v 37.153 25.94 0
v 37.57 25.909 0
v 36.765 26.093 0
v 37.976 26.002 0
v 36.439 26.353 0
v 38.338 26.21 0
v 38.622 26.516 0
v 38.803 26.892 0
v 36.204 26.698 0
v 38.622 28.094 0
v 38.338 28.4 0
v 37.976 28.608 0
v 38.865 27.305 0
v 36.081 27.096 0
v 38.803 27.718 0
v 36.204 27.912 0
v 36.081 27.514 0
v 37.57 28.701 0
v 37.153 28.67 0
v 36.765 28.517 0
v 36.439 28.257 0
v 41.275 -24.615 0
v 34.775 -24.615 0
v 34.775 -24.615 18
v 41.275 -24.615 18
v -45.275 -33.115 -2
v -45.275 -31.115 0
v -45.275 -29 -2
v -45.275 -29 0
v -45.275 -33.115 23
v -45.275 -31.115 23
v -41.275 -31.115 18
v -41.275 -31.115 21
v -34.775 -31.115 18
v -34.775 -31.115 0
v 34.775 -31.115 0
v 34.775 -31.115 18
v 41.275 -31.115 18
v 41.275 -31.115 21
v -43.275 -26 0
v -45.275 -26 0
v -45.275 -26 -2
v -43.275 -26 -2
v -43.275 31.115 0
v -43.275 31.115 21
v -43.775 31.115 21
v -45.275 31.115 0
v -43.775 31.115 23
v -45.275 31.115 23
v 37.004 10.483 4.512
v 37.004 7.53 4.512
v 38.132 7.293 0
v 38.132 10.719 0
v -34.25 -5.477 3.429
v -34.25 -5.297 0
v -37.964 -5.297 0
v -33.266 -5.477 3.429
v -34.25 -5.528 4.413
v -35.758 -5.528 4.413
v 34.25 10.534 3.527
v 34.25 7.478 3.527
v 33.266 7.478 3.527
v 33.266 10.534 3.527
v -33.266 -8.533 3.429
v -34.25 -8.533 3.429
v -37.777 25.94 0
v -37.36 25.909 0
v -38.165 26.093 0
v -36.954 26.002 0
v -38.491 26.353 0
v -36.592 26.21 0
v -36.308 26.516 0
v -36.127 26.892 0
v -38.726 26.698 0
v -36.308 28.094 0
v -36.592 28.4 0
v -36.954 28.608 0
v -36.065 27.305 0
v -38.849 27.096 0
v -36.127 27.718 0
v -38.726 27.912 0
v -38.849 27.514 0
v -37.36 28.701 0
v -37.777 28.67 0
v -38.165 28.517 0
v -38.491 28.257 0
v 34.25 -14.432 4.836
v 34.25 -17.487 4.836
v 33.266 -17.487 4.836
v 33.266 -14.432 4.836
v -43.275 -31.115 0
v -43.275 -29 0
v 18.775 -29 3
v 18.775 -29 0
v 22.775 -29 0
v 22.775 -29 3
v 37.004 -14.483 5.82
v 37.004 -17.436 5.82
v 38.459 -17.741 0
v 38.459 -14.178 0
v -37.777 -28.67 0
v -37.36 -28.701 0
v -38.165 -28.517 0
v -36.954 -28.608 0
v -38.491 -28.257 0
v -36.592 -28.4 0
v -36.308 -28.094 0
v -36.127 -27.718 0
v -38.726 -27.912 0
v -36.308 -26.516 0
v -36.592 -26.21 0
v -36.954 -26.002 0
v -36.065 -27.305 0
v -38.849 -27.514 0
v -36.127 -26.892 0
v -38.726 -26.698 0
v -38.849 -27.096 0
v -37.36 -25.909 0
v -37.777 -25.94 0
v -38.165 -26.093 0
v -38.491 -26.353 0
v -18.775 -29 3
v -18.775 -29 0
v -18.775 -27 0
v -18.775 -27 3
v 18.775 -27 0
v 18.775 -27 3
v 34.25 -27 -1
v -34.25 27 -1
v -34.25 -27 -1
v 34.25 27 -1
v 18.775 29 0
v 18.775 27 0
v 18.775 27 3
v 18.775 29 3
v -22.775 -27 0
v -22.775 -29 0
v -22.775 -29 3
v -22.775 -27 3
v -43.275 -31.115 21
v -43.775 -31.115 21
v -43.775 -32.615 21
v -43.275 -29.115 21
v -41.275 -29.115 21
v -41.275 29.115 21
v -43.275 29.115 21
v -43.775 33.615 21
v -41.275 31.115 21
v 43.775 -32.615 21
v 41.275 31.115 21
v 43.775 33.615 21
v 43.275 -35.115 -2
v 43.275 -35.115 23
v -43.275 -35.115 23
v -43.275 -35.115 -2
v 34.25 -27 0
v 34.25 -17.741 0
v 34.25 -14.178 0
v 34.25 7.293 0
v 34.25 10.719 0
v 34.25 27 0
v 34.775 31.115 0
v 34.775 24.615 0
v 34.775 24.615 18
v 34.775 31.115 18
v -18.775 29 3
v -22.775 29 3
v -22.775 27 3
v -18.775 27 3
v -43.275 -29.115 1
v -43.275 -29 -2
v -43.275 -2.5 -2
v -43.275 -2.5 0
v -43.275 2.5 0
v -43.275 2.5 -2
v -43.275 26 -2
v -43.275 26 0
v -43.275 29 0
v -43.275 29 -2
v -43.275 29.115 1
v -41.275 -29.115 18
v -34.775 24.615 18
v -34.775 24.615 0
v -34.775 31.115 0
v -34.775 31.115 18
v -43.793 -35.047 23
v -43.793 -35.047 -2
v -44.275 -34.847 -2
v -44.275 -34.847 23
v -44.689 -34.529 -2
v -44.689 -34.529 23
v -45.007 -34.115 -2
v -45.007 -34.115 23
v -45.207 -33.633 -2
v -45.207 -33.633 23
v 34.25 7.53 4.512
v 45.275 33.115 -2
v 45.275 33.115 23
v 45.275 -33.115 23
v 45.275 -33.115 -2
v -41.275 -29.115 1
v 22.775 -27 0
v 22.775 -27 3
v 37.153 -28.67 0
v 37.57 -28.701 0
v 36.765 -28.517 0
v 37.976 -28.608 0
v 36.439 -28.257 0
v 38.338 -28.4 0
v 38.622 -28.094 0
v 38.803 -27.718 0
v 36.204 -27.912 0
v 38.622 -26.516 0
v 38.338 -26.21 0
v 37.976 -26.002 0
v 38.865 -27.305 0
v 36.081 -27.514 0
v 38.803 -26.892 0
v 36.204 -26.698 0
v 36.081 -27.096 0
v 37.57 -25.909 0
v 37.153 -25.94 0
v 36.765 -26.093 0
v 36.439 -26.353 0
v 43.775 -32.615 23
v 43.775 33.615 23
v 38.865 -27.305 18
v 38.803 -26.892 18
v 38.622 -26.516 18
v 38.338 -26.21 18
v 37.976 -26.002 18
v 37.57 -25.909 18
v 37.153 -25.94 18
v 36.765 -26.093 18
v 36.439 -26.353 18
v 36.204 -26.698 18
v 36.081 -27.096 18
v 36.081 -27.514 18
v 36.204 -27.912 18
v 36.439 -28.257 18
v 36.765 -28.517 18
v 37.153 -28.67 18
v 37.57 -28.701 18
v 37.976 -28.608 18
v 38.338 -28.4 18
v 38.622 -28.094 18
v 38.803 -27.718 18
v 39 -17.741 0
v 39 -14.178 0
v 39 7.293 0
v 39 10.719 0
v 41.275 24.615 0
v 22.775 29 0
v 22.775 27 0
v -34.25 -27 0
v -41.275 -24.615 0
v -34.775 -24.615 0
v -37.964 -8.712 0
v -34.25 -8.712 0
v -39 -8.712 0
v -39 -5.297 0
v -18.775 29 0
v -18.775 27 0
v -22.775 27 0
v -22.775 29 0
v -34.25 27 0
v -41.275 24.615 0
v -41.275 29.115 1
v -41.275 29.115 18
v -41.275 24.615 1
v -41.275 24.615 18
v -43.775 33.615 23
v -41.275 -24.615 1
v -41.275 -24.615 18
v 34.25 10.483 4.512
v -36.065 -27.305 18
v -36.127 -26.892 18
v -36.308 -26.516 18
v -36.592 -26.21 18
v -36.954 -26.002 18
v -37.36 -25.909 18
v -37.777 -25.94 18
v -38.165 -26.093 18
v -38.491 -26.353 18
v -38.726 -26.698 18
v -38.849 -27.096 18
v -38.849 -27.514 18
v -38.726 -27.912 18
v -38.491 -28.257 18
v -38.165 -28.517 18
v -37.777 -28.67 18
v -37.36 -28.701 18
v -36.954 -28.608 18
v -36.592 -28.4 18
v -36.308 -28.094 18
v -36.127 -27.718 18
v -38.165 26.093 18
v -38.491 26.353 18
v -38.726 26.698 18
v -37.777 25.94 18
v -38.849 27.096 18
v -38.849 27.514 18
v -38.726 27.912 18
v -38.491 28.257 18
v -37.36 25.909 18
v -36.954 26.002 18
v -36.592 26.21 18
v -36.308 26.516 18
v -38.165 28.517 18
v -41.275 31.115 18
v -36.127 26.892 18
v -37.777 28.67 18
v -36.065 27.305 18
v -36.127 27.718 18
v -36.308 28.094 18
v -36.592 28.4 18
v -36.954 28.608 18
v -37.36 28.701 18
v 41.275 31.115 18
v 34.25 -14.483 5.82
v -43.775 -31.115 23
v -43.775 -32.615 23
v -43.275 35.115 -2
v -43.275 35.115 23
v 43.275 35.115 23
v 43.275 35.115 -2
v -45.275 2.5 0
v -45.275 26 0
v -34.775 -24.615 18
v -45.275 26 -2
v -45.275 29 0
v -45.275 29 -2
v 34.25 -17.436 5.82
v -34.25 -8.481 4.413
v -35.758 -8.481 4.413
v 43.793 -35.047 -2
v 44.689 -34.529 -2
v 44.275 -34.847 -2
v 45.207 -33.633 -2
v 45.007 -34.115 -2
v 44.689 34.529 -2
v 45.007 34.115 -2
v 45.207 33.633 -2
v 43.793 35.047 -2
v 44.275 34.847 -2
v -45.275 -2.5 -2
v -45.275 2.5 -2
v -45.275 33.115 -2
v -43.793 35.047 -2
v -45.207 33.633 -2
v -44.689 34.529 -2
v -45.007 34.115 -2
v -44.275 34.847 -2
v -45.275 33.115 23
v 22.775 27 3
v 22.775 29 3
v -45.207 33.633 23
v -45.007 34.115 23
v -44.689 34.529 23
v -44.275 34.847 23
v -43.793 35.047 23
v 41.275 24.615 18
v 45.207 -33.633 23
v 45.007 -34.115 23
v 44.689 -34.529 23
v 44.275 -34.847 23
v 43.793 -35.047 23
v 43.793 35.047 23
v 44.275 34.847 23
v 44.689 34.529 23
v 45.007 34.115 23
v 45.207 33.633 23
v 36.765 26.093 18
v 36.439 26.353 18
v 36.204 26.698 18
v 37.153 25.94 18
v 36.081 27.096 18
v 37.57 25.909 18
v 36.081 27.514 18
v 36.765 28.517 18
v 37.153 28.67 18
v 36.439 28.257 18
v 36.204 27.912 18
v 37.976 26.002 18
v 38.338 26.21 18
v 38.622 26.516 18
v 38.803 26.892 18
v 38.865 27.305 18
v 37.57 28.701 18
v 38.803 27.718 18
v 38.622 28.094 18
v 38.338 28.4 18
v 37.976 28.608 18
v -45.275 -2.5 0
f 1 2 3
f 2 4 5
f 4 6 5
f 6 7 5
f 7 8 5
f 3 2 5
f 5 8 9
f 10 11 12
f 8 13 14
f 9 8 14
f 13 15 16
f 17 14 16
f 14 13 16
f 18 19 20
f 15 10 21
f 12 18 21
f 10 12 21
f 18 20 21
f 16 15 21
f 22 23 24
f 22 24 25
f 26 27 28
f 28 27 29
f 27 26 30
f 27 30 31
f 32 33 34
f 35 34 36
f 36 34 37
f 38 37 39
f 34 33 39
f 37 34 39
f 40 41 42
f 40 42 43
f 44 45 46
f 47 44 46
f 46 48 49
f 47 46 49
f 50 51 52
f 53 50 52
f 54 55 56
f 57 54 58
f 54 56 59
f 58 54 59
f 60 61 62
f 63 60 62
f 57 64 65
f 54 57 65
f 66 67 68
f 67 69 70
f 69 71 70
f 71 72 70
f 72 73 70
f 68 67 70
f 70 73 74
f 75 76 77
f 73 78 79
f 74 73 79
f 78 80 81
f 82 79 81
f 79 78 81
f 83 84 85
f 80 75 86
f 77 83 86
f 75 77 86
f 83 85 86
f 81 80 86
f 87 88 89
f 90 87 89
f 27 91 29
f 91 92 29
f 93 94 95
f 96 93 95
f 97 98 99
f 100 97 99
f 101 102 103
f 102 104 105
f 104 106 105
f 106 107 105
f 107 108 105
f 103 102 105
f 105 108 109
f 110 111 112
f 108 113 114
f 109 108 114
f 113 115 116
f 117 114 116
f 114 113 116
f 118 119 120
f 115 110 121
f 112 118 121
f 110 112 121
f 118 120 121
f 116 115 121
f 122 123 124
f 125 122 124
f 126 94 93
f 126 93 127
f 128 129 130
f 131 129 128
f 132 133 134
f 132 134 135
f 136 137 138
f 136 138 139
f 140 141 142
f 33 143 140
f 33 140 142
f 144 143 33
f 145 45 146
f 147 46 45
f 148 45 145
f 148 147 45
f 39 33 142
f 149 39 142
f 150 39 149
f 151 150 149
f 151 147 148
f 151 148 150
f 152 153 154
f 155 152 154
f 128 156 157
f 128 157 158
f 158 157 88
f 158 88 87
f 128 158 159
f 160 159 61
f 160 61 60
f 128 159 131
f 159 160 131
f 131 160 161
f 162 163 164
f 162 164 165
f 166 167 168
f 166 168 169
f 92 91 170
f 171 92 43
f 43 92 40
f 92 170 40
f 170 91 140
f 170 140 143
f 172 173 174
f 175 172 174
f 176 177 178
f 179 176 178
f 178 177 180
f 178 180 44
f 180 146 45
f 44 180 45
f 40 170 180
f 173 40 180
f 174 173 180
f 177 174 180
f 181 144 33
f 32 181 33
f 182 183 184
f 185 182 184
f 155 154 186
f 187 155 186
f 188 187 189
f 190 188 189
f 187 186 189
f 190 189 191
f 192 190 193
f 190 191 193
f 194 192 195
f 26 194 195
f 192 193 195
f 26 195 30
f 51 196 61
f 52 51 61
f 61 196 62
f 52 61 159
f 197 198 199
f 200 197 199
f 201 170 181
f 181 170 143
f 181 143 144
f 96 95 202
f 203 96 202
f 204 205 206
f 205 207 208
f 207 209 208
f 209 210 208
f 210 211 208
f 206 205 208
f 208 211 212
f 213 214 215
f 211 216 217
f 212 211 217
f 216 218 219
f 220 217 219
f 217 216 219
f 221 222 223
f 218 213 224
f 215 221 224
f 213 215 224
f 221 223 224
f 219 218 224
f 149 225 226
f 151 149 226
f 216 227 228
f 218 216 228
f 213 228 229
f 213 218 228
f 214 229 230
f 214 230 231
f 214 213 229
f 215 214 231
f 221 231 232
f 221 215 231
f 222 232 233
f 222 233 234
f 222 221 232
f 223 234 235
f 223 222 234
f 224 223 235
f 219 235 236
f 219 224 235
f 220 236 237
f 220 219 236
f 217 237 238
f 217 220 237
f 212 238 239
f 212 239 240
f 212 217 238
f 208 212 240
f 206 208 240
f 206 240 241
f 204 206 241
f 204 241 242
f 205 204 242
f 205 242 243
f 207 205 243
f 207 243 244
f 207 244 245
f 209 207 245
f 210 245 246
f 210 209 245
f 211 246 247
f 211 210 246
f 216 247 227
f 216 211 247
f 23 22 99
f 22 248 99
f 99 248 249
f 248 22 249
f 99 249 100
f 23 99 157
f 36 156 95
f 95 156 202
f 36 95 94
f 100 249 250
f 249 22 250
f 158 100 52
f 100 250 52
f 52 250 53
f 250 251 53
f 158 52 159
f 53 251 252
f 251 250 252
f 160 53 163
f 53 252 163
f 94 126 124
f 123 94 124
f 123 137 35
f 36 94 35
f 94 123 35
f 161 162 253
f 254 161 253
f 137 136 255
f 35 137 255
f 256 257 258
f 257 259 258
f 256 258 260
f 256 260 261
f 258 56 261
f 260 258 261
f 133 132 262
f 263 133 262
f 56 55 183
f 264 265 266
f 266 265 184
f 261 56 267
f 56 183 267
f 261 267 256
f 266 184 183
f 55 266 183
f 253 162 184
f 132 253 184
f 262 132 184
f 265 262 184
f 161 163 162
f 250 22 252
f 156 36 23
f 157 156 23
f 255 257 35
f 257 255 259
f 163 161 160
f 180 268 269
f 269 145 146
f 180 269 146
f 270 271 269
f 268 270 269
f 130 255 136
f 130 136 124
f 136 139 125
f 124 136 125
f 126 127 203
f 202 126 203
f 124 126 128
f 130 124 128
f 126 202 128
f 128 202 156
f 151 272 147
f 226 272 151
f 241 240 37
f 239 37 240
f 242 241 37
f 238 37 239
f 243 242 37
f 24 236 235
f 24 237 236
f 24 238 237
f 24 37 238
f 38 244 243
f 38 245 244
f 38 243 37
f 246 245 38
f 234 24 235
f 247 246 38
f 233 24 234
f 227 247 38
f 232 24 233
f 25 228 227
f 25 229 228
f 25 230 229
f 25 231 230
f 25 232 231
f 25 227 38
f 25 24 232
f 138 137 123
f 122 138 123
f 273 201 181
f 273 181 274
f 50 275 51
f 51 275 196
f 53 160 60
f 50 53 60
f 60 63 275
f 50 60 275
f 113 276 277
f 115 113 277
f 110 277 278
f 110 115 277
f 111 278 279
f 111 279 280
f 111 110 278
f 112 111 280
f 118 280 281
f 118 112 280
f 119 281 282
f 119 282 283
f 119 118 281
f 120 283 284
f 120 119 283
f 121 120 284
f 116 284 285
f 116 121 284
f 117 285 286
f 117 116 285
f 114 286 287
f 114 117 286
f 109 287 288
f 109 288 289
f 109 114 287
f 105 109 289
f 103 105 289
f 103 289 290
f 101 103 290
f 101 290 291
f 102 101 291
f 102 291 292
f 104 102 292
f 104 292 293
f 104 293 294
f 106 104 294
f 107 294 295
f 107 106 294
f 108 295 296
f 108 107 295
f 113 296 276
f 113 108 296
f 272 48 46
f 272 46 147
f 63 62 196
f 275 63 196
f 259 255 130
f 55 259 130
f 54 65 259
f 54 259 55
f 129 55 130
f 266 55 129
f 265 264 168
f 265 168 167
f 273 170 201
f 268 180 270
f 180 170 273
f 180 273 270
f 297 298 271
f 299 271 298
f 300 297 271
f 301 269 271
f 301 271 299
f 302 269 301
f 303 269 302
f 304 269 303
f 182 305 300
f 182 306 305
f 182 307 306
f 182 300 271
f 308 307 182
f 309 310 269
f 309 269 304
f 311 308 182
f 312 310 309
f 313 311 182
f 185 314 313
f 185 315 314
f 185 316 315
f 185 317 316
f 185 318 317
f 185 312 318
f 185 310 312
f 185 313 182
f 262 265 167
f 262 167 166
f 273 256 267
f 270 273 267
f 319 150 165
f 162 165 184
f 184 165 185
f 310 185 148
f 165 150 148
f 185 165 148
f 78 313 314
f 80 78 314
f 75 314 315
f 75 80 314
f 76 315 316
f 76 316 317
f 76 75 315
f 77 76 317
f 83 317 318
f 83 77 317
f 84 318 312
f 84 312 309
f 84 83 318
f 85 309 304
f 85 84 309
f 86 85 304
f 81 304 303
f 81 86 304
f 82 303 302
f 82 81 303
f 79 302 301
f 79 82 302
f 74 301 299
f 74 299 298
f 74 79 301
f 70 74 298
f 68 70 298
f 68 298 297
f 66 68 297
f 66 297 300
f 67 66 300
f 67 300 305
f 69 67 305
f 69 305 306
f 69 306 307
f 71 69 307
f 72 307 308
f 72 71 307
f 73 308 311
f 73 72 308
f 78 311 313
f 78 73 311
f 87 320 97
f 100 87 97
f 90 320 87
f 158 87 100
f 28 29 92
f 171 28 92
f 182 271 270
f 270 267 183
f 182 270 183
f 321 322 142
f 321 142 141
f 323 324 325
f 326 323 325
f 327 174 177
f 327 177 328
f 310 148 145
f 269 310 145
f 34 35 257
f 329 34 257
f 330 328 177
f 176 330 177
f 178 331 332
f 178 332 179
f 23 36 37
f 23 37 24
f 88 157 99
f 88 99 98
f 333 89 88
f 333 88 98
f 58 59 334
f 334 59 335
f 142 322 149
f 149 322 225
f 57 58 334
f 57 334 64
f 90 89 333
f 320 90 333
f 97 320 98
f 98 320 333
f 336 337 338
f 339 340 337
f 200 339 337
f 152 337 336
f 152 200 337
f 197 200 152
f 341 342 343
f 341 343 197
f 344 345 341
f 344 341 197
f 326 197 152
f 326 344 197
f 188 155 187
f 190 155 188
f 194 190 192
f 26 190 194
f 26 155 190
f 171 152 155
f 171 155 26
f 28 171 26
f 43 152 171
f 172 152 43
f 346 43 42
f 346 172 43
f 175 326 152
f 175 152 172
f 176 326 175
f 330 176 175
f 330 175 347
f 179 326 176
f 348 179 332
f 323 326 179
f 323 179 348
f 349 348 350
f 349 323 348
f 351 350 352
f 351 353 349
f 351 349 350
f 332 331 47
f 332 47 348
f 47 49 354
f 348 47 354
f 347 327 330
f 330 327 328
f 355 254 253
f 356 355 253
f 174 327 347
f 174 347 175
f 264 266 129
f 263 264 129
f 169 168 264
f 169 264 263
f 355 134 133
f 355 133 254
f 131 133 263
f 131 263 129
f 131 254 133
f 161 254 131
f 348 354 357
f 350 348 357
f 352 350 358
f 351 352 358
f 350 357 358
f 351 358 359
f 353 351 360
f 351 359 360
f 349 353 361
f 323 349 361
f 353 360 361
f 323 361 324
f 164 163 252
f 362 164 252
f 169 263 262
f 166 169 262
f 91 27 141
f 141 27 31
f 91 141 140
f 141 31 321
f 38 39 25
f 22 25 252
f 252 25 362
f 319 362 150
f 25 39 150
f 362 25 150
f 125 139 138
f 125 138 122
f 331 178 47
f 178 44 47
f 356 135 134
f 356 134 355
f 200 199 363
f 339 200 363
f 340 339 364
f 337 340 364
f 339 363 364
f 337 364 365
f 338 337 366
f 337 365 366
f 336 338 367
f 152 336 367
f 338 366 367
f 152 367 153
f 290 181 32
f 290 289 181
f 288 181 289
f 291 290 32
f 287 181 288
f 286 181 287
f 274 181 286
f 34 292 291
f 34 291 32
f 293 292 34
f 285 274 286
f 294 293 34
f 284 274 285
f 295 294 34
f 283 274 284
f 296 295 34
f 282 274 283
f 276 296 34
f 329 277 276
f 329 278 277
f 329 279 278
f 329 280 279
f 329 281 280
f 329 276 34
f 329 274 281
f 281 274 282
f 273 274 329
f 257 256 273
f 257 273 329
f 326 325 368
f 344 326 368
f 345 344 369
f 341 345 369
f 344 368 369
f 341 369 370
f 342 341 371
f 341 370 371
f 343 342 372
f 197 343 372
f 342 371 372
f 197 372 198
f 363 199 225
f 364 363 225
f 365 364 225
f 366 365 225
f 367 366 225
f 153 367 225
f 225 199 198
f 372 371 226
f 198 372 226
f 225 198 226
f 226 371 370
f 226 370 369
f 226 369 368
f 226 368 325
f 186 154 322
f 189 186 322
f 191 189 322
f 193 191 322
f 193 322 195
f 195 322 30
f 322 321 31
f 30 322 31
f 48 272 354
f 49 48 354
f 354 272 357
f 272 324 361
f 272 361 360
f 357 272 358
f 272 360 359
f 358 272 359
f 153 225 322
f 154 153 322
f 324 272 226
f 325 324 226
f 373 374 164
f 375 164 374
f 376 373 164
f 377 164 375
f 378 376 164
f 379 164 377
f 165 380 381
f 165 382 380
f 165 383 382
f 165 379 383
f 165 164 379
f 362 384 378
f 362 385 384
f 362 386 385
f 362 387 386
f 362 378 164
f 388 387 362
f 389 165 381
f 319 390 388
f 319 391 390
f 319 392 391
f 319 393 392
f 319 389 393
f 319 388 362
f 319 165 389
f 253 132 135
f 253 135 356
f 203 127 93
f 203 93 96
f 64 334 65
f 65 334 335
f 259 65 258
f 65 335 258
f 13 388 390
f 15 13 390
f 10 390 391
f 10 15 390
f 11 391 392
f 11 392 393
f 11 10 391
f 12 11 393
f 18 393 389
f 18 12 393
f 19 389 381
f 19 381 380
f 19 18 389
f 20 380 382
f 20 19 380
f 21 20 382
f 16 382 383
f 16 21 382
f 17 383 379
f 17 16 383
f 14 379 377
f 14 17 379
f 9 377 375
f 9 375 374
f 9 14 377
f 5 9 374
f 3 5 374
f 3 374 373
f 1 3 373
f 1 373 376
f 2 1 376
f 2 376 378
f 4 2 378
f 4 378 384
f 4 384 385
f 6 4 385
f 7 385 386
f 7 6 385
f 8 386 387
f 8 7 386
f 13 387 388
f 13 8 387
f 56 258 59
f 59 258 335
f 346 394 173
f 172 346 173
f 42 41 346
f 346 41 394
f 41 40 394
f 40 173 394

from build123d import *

# Parameters (mm, degrees)
BOSS_EXTRUDE1_DEPTH = 2
SKETCH2_W           = 6.5
SKETCH2_H           = 6.5
SKETCH2_R           = 1.4
BOSS_EXTRUDE2_DEPTH = 18
SKETCH3_W           = 68.5
SKETCH3_H           = 54
CUT_EXTRUDE1_DEPTH  = 1
SNAP_START          = 34.25
SNAP_HOOK1_DEPTH    = 2.753937008
SNAP_START_2        = 7.4782452
SNAP_HOOK1_2_DEPTH  = 3.055920826
SNAP_START_3        = 7.293382709
SNAP_HOOK1_3_DEPTH  = 3.425645808
SNAP_START_4        = 32
SNAP_HOOK1_4_DEPTH  = 7
LPATTERN1_START     = 34.25
LPATTERN1_DEPTH     = 2.753937008
LPATTERN1_START_2   = -17.740925941
LPATTERN1_2_DEPTH   = 3.56278637
LPATTERN1_START_3   = -17.487493169
LPATTERN1_3_DEPTH   = 3.055920826
LPATTERN1_START_4   = 32
LPATTERN1_4_DEPTH   = 7
SNAP_START_5        = -35.757874016
SNAP_HOOK2_DEPTH    = 1.507874016
SNAP_START_6        = -8.712249477
SNAP_HOOK2_2_DEPTH  = 3.415306745
SNAP_START_7        = -8.532556518
SNAP_HOOK2_3_DEPTH  = 3.055920826
SNAP_START_8        = -39
SNAP_HOOK2_4_DEPTH  = 7
BOSS_EXTRUDE3_START = 23
BOSS_EXTRUDE3_DEPTH = 23
SKETCH5_W           = 87.55
SKETCH5_H           = 66.23
CUT_EXTRUDE2_DEPTH  = 2
SKETCH6_W           = 2
SKETCH6_H           = 62.23
BOSS_EXTRUDE4_DEPTH = 1
SKETCH7_W           = 2
SKETCH7_H           = 3
SKETCH7_H_2         = 5
CUT_EXTRUDE3_DEPTH  = 2
SKETCH9_W           = 4
SKETCH9_H           = 2
BOSS_EXTRUDE6_DEPTH = 3


with BuildPart() as part:
    # Sketch1 → Boss-Extrude1 (new body)
    with BuildSketch(Plane.XY):
        with BuildLine():
            Line((-43.275, 35.115), (43.275, 35.115))
            ThreePointArc((43.275, 35.115), (44.689213562, 34.529213562), (45.275, 33.115))
            Line((45.275, 33.115), (45.275, -33.115))
            ThreePointArc((45.275, -33.115), (44.689213562, -34.529213562), (43.275, -35.115))
            Line((43.275, -35.115), (-43.275, -35.115))
            ThreePointArc((-43.275, -35.115), (-44.689213562, -34.529213562), (-45.275, -33.115))
            Line((-45.275, -33.115), (-45.275, 33.115))
            ThreePointArc((-45.275, 33.115), (-44.689213562, 34.529213562), (-43.275, 35.115))
        make_face()
    extrude(amount=-BOSS_EXTRUDE1_DEPTH)

    # Sketch2 → Boss-Extrude2 (add)
    # profile 1 of 4: a face of its own
    with BuildSketch(Plane.XY):
        with Locations((-38.025, -27.865)):
            Rectangle(SKETCH2_W, SKETCH2_H)
        with Locations((-37.465, -27.305)):
            Circle(SKETCH2_R, mode=Mode.SUBTRACT)
    # profile 2 of 4: a face of its own
    with BuildSketch(Plane.XY):
        with Locations((-38.025, 27.865)):
            Rectangle(SKETCH2_W, SKETCH2_H)
        with Locations((-37.465, 27.305)):
            Circle(SKETCH2_R, mode=Mode.SUBTRACT)
    # profile 3 of 4: a face of its own
    with BuildSketch(Plane.XY):
        with Locations((38.025, -27.865)):
            Rectangle(SKETCH2_W, SKETCH2_H)
        with Locations((37.465, -27.305)):
            Circle(SKETCH2_R, mode=Mode.SUBTRACT)
    # profile 4 of 4: a face of its own
    with BuildSketch(Plane.XY):
        with Locations((38.025, 27.865)):
            Rectangle(SKETCH2_W, SKETCH2_H)
        with Locations((37.465, 27.305)):
            Circle(SKETCH2_R, mode=Mode.SUBTRACT)
    extrude(amount=BOSS_EXTRUDE2_DEPTH)

    # Sketch3 → Cut-Extrude1 (cut)
    with BuildSketch(Plane.XY):
        Rectangle(SKETCH3_W, SKETCH3_H)
    extrude(amount=-CUT_EXTRUDE1_DEPTH, mode=Mode.SUBTRACT)

    # Snap Hook1: read off the stored shape, not the designer's step
    # Snap Hook1 outline → Snap Hook1 (add)
    with BuildSketch(Plane.YZ.offset(SNAP_START)):
        Polygon((10.482583566, 4.511638427), (7.52982766, 4.511638427), (7.293382709, 0), (10.719028517, 0), align=None)
    extrude(amount=SNAP_HOOK1_DEPTH)

    # Snap Hook1 2 outline → Snap Hook1 2 (add)
    with BuildSketch(Plane(origin=(0, 0, 0), x_dir=(1, 0, 0), z_dir=(0, 1, 0)).offset(SNAP_START_2)):
        Polygon((34.25, -3.527386458), (33.265748031, -3.527386458), (34.25, -4.511638427), align=None)
        Polygon((38.131846615, 0), (37.003937008, 0), (37.003937008, -4.511638427), align=None)
    extrude(amount=SNAP_HOOK1_2_DEPTH)

    # Snap Hook1 3 outline → Snap Hook1 3 (add)
    with BuildSketch(Plane(origin=(0, 0, 0), x_dir=(1, 0, 0), z_dir=(0, 1, 0)).offset(SNAP_START_3)):
        Polygon((38.131846615, 0), (37.003937008, 0), (37.003937008, -4.511638427), align=None)
    extrude(amount=SNAP_HOOK1_3_DEPTH)

    # Snap Hook1 4 outline → Snap Hook1 4 (cut)
    with BuildSketch(Plane.YZ.offset(SNAP_START_4)):
        Polygon((10.719028517, 0), (10.719028517, 6), (10.404581841, 6), (10.482583566, 4.511638427), align=None)
        Polygon((7.52982766, 4.511638427), (7.607829385, 6), (7.293382709, 6), (7.293382709, 0), align=None)
    extrude(amount=SNAP_HOOK1_4_DEPTH, mode=Mode.SUBTRACT)

    # LPattern1: read off the stored shape, not the designer's step
    # LPattern1 outline → LPattern1 (add)
    with BuildSketch(Plane.YZ.offset(LPATTERN1_START)):
        Polygon((-14.483154803, 5.820037333), (-17.435910709, 5.820037333), (-17.740925941, 0), (-14.178139571, 0), align=None)
    extrude(amount=LPATTERN1_DEPTH)

    # LPattern1 2 outline → LPattern1 2 (add)
    with BuildSketch(Plane(origin=(0, 0, 0), x_dir=(1, 0, 0), z_dir=(0, 1, 0)).offset(LPATTERN1_START_2)):
        Polygon((38.458946341, 0), (37.003937008, 0), (37.003937008, -5.820037333), align=None)
    extrude(amount=LPATTERN1_2_DEPTH)

    # LPattern1 3 outline → LPattern1 3 (add)
    with BuildSketch(Plane(origin=(0, 0, 0), x_dir=(1, 0, 0), z_dir=(0, 1, 0)).offset(LPATTERN1_START_3)):
        Polygon((34.25, -4.835785364), (33.265748031, -4.835785364), (34.25, -5.820037333), align=None)
    extrude(amount=LPATTERN1_3_DEPTH)

    # LPattern1 4 outline → LPattern1 4 (cut)
    with BuildSketch(Plane.YZ.offset(LPATTERN1_START_4)):
        Polygon((-14.178139571, 0), (-14.178139571, 7), (-14.544994026, 7), (-14.483154803, 5.820037333), align=None)
        Polygon((-17.435910709, 5.820037333), (-17.374071486, 7), (-17.740925941, 7), (-17.740925941, 0), align=None)
    extrude(amount=LPATTERN1_4_DEPTH, mode=Mode.SUBTRACT)

    # Snap Hook2: read off the stored shape, not the designer's step
    # Snap Hook2 outline → Snap Hook2 (add)
    with BuildSketch(Plane.YZ.offset(SNAP_START_5)):
        Polygon((-5.528218152, 4.412997898), (-8.480974058, 4.412997898), (-8.712249477, 0), (-5.296942732, 0), align=None)
    extrude(amount=SNAP_HOOK2_DEPTH)

    # Snap Hook2 2 outline → Snap Hook2 2 (add)
    with BuildSketch(Plane(origin=(0, 0, 0), x_dir=(1, 0, 0), z_dir=(0, 1, 0)).offset(SNAP_START_6)):
        Polygon((-35.757874016, -4.412997898), (-35.757874016, 0), (-37.964372965, 0), align=None)
    extrude(amount=SNAP_HOOK2_2_DEPTH)

    # Snap Hook2 3 outline → Snap Hook2 3 (add)
    with BuildSketch(Plane(origin=(0, 0, 0), x_dir=(1, 0, 0), z_dir=(0, 1, 0)).offset(SNAP_START_7)):
        Polygon((-34.25, -3.428745929), (-34.25, -4.412997898), (-33.265748031, -3.428745929), align=None)
    extrude(amount=SNAP_HOOK2_3_DEPTH)

    # Snap Hook2 4 outline → Snap Hook2 4 (cut)
    with BuildSketch(Plane.YZ.offset(SNAP_START_8)):
        Polygon((-8.480974058, 4.412997898), (-8.397802802, 6), (-8.712249477, 6), (-8.712249477, 0), align=None)
        Polygon((-5.611389408, 6), (-5.528218152, 4.412997898), (-5.296942732, 0), (-5.296942732, 6), align=None)
    extrude(amount=SNAP_HOOK2_4_DEPTH, mode=Mode.SUBTRACT)

    # Sketch4 → Boss-Extrude3 (add)
    with BuildSketch(Plane.XY.offset(BOSS_EXTRUDE3_START)):
        with BuildLine():
            Line((-43.275, 35.115), (43.275, 35.115))
            ThreePointArc((43.275, 35.115), (44.689213562, 34.529213562), (45.275, 33.115))
            Line((45.275, 33.115), (45.275, -33.115))
            ThreePointArc((45.275, -33.115), (44.689213562, -34.529213562), (43.275, -35.115))
            Line((43.275, -35.115), (-43.275, -35.115))
            ThreePointArc((-43.275, -35.115), (-44.689213562, -34.529213562), (-45.275, -33.115))
            Line((-45.275, -33.115), (-45.275, -31.115))
            Line((-45.275, -31.115), (-43.275, -31.115))
            Line((-43.275, -31.115), (-43.275, -29.115))
            Line((-43.275, -29.115), (-41.275, -29.115))
            Line((-41.275, -29.115), (-41.275, -31.115))
            Line((-41.275, -31.115), (41.275, -31.115))
            Line((41.275, -31.115), (41.275, 31.115))
            Line((41.275, 31.115), (-41.275, 31.115))
            Line((-41.275, 31.115), (-41.275, 29.115))
            Line((-41.275, 29.115), (-43.275, 29.115))
            Line((-43.275, 29.115), (-43.275, 31.115))
            Line((-43.275, 31.115), (-45.275, 31.115))
            Line((-45.275, 31.115), (-45.275, 33.115))
            ThreePointArc((-45.275, 33.115), (-44.689213562, 34.529213562), (-43.275, 35.115))
        make_face()
    extrude(amount=-BOSS_EXTRUDE3_DEPTH)

    # Sketch5 → Cut-Extrude2 (cut)
    with BuildSketch(Plane.XY.offset(23)):
        with Locations((0, 0.5)):
            Rectangle(SKETCH5_W, SKETCH5_H)
    extrude(amount=-CUT_EXTRUDE2_DEPTH, mode=Mode.SUBTRACT)

    # Sketch6 → Boss-Extrude4 (add)
    with BuildSketch(Plane.XY):
        with Locations((-42.275, 0)):
            Rectangle(SKETCH6_W, SKETCH6_H)
    extrude(amount=BOSS_EXTRUDE4_DEPTH)

    # Sketch7 → Cut-Extrude3 (cut)
    with BuildSketch(Plane.XY):
        with Locations((-44.275, 27.5)):
            Rectangle(SKETCH7_W, SKETCH7_H)
        with Locations((-44.275, -27.5)):
            Rectangle(SKETCH7_W, SKETCH7_H)
        with Locations((-44.275, 0)):
            Rectangle(SKETCH7_W, SKETCH7_H_2)
    extrude(amount=-CUT_EXTRUDE3_DEPTH, mode=Mode.SUBTRACT)

    # Sketch9 → Boss-Extrude6 (add)
    with BuildSketch(Plane.XY):
        with Locations((20.775, 28)):
            Rectangle(SKETCH9_W, SKETCH9_H)
        with Locations((-20.775, 28)):
            Rectangle(SKETCH9_W, SKETCH9_H)
        with Locations((20.775, -28)):
            Rectangle(SKETCH9_W, SKETCH9_H)
        with Locations((-20.775, -28)):
            Rectangle(SKETCH9_W, SKETCH9_H)
    extrude(amount=BOSS_EXTRUDE6_DEPTH)


solid = part.part
